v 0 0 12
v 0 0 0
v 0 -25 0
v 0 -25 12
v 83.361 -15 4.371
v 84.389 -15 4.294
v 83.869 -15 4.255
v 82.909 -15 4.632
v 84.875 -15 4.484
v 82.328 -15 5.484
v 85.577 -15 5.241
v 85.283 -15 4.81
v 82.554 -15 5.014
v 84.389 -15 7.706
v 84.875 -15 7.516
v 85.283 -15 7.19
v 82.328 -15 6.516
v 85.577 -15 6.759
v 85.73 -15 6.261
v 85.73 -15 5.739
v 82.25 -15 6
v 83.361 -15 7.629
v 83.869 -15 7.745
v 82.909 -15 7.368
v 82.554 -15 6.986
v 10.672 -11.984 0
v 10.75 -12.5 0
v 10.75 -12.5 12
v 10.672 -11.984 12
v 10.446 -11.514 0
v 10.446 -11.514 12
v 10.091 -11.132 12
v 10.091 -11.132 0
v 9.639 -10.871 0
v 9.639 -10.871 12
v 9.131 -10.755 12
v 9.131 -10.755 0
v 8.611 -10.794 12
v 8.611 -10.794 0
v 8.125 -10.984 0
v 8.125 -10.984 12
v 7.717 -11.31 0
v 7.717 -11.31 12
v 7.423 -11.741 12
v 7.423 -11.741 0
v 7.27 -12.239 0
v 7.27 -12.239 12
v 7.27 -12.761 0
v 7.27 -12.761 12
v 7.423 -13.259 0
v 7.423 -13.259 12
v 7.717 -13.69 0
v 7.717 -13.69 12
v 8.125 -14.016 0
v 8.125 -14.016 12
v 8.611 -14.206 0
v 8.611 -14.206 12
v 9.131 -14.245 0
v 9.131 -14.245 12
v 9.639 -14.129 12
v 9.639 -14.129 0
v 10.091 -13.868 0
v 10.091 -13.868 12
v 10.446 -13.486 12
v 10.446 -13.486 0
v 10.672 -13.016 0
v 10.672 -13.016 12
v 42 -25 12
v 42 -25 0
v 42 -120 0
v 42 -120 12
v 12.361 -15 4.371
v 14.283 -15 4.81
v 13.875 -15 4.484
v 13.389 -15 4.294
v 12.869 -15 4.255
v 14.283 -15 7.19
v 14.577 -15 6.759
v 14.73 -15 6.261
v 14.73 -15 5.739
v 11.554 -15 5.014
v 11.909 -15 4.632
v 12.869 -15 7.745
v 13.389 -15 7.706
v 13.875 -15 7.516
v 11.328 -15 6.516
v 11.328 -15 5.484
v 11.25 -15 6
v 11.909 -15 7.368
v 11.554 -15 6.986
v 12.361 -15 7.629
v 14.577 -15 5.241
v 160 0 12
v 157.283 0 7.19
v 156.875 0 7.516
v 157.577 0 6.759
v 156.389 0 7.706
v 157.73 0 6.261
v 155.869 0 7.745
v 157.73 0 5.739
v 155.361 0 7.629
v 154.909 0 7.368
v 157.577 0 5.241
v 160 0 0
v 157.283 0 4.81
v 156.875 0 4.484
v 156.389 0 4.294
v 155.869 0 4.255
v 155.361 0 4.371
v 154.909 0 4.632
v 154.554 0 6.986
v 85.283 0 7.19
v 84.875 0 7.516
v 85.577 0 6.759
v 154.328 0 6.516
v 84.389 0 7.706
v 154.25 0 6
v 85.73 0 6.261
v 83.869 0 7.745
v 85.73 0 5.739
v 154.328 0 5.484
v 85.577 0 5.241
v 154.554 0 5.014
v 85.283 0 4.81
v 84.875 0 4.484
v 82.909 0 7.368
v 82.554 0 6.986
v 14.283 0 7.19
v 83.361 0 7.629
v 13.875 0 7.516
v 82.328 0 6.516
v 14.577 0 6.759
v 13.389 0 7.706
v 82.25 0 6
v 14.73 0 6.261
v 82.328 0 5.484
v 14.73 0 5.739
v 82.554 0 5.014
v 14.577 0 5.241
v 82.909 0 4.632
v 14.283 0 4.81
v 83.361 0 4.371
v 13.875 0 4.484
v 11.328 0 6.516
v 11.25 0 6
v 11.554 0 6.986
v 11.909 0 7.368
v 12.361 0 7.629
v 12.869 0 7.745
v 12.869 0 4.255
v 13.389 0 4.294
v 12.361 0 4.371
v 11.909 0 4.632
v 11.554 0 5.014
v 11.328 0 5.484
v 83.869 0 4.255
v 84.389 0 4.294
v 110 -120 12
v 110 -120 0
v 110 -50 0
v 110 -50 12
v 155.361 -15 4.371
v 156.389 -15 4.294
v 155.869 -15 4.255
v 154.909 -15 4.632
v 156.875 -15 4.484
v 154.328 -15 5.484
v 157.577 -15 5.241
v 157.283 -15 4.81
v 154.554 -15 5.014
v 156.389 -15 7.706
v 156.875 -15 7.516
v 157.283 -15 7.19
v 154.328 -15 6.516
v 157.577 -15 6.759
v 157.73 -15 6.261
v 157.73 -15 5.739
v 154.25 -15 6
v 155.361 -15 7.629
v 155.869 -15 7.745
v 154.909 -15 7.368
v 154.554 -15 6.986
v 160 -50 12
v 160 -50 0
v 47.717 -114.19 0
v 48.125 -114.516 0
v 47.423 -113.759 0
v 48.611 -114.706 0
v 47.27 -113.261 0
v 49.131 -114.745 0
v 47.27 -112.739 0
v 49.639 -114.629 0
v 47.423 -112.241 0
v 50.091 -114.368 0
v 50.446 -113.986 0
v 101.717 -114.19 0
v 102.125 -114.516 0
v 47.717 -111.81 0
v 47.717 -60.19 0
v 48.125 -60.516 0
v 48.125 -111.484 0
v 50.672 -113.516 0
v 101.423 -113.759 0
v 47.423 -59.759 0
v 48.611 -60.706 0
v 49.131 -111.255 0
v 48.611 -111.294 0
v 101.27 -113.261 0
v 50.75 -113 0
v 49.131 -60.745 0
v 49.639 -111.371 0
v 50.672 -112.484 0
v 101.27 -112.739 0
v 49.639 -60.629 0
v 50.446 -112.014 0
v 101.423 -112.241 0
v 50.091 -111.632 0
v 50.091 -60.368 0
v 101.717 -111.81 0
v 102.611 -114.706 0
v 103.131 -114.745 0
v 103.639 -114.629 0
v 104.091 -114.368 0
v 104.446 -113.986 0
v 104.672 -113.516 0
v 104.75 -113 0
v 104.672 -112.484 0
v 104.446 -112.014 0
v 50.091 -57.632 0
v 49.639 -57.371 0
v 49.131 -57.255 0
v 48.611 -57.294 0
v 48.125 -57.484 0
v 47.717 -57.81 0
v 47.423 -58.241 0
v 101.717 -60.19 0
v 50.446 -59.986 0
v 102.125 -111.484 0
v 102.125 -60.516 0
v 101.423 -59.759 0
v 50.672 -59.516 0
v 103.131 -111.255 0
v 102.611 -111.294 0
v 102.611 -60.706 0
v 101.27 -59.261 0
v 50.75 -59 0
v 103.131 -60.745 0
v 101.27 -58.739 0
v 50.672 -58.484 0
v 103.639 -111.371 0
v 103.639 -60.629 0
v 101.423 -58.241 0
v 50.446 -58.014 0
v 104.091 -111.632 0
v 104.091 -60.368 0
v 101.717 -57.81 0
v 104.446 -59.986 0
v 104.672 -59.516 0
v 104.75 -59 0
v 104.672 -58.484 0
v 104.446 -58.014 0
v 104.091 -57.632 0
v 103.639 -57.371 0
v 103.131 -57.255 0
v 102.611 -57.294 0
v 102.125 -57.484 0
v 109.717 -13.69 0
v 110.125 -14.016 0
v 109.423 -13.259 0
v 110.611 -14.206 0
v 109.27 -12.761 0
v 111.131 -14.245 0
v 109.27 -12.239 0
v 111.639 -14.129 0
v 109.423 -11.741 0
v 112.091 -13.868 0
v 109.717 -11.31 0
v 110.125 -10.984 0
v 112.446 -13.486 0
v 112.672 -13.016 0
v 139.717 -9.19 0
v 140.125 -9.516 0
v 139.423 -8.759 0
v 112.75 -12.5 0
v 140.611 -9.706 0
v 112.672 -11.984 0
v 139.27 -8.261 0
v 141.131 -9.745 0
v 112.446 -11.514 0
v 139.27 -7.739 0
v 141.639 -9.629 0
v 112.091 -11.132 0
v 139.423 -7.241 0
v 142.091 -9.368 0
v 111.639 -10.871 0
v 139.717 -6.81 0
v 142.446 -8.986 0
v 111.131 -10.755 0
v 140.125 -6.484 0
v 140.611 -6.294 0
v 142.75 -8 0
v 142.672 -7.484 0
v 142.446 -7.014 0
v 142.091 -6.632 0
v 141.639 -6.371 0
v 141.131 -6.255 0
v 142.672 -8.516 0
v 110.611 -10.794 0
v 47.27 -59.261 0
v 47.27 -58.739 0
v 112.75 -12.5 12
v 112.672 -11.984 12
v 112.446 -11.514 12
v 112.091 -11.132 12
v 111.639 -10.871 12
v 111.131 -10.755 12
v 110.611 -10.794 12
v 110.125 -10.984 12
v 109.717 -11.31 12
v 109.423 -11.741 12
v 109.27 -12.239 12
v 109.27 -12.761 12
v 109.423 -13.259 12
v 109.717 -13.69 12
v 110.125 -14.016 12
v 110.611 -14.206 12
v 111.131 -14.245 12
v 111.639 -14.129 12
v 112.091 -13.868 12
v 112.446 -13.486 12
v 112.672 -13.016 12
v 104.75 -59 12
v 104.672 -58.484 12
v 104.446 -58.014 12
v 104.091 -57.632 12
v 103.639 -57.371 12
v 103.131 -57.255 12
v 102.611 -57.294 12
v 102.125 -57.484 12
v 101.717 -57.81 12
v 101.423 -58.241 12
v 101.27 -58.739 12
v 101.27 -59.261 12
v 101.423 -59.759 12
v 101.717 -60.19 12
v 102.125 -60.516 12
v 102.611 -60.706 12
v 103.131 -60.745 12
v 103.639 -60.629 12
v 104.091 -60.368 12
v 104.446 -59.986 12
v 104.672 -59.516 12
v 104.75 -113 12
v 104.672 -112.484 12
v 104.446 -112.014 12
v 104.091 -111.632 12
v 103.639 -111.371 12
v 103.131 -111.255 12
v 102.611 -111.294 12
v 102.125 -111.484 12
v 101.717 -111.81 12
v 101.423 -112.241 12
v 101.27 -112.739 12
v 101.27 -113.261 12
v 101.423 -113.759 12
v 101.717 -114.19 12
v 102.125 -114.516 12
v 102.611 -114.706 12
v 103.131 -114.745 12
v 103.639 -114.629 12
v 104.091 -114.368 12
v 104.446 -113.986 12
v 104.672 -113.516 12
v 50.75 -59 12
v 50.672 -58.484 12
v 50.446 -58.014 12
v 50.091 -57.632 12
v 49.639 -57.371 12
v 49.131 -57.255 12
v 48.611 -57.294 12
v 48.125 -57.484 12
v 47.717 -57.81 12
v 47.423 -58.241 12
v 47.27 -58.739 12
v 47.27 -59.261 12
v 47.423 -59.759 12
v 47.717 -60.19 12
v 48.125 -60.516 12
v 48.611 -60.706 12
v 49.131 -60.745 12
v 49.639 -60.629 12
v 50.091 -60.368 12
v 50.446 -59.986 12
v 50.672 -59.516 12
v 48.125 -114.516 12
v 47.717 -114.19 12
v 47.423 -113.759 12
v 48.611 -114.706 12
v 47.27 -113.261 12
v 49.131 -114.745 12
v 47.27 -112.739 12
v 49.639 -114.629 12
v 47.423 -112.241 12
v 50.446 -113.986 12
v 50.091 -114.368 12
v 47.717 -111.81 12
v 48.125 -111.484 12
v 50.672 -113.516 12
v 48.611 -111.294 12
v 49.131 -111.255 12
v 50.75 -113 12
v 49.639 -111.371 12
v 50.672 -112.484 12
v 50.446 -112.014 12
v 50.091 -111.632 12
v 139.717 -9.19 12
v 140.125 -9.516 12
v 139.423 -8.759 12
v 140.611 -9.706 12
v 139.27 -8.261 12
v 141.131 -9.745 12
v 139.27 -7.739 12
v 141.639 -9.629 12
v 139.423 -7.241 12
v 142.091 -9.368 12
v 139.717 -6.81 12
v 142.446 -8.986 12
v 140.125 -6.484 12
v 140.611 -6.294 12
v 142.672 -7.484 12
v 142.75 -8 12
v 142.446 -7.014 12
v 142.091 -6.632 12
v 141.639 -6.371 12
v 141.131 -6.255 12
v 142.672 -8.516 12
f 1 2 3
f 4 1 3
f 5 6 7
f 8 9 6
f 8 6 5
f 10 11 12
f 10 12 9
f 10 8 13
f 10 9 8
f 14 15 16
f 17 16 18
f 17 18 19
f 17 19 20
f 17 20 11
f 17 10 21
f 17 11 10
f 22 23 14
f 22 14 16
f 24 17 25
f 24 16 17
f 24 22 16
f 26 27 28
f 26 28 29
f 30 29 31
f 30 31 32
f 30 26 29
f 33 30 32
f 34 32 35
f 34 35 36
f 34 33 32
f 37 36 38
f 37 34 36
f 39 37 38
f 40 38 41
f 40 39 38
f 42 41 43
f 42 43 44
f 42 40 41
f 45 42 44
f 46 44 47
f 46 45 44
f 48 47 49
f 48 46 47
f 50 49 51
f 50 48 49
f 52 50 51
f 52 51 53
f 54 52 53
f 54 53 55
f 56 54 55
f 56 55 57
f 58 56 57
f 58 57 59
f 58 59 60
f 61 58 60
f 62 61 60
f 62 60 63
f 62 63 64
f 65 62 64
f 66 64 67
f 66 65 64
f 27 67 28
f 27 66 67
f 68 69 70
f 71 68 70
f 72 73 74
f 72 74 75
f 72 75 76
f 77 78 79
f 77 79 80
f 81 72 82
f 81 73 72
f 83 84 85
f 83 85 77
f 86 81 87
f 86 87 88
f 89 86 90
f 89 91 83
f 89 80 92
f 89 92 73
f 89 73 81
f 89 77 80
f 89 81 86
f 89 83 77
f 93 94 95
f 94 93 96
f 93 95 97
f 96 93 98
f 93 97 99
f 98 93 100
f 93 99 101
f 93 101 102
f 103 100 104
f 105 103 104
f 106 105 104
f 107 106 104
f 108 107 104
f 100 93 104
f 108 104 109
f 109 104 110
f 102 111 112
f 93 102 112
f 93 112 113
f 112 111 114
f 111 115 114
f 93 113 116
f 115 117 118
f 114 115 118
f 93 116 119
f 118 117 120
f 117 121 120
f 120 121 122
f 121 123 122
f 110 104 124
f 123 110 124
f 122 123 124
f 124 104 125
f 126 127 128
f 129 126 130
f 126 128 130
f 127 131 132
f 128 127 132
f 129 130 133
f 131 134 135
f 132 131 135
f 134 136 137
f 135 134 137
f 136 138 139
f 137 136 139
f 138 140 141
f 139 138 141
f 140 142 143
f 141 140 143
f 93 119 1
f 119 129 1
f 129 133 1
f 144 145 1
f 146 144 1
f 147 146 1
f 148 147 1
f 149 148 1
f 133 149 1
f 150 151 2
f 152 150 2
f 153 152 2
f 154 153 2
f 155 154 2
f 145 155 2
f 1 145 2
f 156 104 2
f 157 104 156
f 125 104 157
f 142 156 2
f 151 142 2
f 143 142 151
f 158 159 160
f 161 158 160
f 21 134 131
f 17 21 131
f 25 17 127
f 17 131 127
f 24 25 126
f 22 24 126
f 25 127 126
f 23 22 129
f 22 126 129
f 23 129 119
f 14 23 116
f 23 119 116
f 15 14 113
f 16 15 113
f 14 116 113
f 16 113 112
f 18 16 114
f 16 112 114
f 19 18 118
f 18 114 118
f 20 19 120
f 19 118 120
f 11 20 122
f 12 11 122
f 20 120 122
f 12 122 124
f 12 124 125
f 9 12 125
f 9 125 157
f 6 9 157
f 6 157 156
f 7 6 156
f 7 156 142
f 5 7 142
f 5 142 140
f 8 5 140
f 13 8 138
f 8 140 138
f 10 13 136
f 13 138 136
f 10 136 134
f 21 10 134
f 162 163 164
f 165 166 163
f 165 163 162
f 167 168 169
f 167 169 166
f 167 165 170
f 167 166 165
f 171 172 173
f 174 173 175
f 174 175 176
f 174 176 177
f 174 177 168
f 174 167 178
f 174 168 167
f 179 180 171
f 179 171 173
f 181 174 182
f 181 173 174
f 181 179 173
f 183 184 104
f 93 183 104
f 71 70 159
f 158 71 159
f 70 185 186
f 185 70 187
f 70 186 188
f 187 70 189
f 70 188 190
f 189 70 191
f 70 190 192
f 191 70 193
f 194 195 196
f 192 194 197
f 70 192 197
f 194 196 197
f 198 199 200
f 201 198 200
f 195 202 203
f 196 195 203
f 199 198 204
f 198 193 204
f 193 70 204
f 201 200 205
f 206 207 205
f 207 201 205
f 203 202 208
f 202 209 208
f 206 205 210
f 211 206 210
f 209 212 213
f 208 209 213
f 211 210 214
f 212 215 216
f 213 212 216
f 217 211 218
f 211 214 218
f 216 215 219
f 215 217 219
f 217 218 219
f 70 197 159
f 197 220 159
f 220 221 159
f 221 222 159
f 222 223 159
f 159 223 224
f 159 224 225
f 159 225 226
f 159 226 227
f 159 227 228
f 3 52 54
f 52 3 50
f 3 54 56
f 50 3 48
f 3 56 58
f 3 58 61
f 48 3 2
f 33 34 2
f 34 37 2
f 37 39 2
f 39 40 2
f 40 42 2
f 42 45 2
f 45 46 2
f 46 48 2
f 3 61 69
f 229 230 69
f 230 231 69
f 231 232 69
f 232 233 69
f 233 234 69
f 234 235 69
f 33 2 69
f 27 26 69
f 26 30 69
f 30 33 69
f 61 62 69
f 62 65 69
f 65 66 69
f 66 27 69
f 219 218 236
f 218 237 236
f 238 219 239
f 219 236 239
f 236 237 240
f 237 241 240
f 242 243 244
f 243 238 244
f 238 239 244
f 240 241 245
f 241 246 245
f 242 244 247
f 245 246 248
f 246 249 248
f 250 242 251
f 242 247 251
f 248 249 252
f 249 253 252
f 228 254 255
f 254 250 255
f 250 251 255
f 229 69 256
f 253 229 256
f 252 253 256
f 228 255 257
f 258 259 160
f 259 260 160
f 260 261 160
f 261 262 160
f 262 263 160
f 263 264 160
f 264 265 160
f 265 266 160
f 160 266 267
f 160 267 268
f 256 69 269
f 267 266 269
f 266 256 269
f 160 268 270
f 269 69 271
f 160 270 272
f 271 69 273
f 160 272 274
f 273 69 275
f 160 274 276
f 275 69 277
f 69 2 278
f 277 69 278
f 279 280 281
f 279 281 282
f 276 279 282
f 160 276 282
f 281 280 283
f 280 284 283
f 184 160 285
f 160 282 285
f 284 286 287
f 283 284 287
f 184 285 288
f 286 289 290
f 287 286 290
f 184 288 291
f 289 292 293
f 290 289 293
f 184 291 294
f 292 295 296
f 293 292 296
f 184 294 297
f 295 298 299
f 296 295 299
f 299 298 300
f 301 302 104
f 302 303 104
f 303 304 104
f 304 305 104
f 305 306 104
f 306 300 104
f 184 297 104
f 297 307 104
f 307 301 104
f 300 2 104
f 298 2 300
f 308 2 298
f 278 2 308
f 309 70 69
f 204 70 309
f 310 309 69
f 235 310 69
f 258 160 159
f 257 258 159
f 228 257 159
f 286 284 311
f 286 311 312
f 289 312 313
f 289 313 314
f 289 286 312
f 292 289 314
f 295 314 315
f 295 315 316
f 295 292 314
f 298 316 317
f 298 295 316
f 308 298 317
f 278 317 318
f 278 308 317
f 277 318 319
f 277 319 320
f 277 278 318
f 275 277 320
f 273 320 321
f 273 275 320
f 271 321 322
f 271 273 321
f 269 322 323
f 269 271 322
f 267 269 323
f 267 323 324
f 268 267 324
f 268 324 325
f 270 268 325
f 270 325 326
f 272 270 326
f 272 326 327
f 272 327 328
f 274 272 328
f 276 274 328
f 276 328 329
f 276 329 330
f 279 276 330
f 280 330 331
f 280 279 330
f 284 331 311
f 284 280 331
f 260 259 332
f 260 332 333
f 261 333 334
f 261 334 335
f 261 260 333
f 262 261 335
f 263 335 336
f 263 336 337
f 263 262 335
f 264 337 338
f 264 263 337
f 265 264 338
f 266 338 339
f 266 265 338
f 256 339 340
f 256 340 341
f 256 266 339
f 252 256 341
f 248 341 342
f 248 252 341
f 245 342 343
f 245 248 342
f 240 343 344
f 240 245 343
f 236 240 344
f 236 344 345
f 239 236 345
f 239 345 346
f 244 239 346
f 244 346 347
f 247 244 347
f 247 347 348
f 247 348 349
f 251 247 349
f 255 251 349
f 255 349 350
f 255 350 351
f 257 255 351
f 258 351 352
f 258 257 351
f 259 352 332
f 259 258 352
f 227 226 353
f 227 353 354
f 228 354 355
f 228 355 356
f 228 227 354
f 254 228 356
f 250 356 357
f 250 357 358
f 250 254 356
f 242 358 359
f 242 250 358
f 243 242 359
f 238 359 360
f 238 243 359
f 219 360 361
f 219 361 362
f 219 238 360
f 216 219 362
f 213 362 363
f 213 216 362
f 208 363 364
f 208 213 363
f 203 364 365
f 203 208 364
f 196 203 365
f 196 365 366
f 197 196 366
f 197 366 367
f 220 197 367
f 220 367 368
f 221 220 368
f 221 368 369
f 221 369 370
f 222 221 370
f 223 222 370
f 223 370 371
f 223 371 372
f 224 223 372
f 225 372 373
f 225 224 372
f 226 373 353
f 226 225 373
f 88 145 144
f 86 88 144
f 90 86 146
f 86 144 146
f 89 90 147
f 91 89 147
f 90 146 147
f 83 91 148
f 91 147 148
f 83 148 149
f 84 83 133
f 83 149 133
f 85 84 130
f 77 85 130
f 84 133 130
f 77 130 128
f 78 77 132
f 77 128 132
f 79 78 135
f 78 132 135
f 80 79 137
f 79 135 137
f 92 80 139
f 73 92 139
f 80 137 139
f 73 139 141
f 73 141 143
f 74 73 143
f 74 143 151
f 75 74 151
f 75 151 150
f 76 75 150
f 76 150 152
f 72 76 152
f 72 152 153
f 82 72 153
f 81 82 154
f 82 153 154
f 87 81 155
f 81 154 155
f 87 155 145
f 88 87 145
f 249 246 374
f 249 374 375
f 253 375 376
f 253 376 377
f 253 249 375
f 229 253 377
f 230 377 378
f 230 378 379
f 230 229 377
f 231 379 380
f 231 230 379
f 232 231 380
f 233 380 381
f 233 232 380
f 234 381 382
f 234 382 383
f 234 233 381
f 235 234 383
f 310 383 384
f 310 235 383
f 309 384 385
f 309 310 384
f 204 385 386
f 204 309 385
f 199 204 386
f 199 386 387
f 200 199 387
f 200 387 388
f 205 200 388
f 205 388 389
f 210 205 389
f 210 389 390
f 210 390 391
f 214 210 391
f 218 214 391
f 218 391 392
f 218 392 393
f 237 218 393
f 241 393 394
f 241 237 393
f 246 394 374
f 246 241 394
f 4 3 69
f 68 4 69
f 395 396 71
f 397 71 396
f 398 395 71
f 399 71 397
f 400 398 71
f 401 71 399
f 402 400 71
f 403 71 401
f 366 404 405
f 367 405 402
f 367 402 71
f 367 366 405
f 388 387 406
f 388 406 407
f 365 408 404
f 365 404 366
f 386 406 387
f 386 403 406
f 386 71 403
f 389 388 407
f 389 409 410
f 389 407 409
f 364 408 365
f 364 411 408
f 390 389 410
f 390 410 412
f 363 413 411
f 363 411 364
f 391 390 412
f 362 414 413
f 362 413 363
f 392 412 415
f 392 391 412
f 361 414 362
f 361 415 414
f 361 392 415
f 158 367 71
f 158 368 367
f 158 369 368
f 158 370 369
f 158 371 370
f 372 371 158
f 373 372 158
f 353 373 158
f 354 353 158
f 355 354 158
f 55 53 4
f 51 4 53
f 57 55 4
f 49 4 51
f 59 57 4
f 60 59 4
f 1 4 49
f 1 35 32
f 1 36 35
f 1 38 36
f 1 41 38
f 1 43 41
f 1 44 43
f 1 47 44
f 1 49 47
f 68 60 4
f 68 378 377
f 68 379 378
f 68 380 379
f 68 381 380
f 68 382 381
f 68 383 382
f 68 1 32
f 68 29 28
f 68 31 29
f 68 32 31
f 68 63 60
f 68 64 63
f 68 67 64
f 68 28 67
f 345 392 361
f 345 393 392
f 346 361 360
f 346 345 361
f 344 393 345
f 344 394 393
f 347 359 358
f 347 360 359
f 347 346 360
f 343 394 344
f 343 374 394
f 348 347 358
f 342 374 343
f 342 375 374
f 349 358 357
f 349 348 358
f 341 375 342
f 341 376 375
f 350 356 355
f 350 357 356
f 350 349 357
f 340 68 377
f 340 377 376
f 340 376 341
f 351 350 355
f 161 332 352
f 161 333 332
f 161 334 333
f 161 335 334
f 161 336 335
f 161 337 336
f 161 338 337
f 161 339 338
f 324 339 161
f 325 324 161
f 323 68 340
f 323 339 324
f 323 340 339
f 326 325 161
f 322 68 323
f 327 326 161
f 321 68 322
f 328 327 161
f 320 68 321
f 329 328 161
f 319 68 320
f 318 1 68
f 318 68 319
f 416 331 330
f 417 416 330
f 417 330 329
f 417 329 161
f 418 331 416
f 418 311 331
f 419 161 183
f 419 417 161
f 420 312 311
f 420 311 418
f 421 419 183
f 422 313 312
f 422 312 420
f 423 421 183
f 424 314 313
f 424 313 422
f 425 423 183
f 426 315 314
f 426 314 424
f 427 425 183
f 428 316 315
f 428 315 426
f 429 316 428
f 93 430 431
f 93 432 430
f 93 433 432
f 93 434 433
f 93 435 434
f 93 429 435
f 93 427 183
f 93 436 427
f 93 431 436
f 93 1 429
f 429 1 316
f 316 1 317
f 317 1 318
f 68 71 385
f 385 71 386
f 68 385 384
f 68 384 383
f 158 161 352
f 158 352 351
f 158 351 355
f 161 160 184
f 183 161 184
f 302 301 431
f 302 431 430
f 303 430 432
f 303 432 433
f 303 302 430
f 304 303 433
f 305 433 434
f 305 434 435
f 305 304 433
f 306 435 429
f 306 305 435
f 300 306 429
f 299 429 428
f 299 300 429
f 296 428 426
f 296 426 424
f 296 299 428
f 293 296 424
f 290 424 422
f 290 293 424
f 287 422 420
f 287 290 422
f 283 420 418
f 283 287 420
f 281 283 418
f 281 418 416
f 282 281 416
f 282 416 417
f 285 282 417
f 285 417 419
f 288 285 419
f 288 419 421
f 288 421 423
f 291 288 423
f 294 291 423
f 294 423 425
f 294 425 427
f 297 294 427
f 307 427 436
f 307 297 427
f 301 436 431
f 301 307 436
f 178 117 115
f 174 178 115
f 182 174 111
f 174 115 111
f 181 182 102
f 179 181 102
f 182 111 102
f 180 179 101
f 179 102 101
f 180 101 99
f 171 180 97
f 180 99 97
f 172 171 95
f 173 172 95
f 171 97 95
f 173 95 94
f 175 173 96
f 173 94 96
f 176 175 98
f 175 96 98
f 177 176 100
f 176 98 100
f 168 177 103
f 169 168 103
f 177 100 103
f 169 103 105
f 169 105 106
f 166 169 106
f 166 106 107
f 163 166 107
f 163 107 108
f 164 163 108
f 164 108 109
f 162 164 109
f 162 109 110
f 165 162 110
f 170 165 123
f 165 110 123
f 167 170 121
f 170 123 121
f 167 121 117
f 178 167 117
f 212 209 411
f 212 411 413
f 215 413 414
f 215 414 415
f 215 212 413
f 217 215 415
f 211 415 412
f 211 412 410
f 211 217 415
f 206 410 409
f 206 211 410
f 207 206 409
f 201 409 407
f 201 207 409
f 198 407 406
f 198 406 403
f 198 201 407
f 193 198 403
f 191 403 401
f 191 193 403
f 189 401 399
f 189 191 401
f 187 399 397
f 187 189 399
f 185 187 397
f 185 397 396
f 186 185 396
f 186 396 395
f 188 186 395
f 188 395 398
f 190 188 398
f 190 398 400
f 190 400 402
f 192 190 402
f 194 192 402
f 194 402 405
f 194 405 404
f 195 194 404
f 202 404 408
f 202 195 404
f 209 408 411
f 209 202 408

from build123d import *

# Parameters (mm, degrees)
F0_R     = 1.75
F1_DEPTH = 12
F2_R     = 1.75
F3_DEPTH = 15


with BuildPart() as f1:
    # F0 (on Top) → F1 (new body)
    with BuildSketch(Plane.XY):
        Polygon((160, 0), (0, 0), (0, -25), (42, -25), (42, -120), (110, -120), (110, -50), (160, -50), align=None)
        with Locations((49, -113)):
            Circle(F0_R, mode=Mode.SUBTRACT)
        with Locations((103, -113)):
            Circle(F0_R, mode=Mode.SUBTRACT)
        with Locations((49, -59)):
            Circle(F0_R, mode=Mode.SUBTRACT)
        with Locations((9, -12.5)):
            Circle(F0_R, mode=Mode.SUBTRACT)
        with Locations((103, -59)):
            Circle(F0_R, mode=Mode.SUBTRACT)
        with Locations((111, -12.5)):
            Circle(F0_R, mode=Mode.SUBTRACT)
        with Locations((141, -8)):
            Circle(F0_R, mode=Mode.SUBTRACT)
    extrude(amount=F1_DEPTH)

    # F2 (on face) → F3 (cut)
    with BuildSketch(Plane(origin=(0, 0, 0), x_dir=(-1, 0, 0), z_dir=(0, 1, 0))):
        with Locations((-156, 6)):
            Circle(F2_R)
        with Locations((-84, 6)):
            Circle(F2_R)
        with Locations((-13, 6)):
            Circle(F2_R)
    extrude(amount=-F3_DEPTH, mode=Mode.SUBTRACT)


solid = f1.part
